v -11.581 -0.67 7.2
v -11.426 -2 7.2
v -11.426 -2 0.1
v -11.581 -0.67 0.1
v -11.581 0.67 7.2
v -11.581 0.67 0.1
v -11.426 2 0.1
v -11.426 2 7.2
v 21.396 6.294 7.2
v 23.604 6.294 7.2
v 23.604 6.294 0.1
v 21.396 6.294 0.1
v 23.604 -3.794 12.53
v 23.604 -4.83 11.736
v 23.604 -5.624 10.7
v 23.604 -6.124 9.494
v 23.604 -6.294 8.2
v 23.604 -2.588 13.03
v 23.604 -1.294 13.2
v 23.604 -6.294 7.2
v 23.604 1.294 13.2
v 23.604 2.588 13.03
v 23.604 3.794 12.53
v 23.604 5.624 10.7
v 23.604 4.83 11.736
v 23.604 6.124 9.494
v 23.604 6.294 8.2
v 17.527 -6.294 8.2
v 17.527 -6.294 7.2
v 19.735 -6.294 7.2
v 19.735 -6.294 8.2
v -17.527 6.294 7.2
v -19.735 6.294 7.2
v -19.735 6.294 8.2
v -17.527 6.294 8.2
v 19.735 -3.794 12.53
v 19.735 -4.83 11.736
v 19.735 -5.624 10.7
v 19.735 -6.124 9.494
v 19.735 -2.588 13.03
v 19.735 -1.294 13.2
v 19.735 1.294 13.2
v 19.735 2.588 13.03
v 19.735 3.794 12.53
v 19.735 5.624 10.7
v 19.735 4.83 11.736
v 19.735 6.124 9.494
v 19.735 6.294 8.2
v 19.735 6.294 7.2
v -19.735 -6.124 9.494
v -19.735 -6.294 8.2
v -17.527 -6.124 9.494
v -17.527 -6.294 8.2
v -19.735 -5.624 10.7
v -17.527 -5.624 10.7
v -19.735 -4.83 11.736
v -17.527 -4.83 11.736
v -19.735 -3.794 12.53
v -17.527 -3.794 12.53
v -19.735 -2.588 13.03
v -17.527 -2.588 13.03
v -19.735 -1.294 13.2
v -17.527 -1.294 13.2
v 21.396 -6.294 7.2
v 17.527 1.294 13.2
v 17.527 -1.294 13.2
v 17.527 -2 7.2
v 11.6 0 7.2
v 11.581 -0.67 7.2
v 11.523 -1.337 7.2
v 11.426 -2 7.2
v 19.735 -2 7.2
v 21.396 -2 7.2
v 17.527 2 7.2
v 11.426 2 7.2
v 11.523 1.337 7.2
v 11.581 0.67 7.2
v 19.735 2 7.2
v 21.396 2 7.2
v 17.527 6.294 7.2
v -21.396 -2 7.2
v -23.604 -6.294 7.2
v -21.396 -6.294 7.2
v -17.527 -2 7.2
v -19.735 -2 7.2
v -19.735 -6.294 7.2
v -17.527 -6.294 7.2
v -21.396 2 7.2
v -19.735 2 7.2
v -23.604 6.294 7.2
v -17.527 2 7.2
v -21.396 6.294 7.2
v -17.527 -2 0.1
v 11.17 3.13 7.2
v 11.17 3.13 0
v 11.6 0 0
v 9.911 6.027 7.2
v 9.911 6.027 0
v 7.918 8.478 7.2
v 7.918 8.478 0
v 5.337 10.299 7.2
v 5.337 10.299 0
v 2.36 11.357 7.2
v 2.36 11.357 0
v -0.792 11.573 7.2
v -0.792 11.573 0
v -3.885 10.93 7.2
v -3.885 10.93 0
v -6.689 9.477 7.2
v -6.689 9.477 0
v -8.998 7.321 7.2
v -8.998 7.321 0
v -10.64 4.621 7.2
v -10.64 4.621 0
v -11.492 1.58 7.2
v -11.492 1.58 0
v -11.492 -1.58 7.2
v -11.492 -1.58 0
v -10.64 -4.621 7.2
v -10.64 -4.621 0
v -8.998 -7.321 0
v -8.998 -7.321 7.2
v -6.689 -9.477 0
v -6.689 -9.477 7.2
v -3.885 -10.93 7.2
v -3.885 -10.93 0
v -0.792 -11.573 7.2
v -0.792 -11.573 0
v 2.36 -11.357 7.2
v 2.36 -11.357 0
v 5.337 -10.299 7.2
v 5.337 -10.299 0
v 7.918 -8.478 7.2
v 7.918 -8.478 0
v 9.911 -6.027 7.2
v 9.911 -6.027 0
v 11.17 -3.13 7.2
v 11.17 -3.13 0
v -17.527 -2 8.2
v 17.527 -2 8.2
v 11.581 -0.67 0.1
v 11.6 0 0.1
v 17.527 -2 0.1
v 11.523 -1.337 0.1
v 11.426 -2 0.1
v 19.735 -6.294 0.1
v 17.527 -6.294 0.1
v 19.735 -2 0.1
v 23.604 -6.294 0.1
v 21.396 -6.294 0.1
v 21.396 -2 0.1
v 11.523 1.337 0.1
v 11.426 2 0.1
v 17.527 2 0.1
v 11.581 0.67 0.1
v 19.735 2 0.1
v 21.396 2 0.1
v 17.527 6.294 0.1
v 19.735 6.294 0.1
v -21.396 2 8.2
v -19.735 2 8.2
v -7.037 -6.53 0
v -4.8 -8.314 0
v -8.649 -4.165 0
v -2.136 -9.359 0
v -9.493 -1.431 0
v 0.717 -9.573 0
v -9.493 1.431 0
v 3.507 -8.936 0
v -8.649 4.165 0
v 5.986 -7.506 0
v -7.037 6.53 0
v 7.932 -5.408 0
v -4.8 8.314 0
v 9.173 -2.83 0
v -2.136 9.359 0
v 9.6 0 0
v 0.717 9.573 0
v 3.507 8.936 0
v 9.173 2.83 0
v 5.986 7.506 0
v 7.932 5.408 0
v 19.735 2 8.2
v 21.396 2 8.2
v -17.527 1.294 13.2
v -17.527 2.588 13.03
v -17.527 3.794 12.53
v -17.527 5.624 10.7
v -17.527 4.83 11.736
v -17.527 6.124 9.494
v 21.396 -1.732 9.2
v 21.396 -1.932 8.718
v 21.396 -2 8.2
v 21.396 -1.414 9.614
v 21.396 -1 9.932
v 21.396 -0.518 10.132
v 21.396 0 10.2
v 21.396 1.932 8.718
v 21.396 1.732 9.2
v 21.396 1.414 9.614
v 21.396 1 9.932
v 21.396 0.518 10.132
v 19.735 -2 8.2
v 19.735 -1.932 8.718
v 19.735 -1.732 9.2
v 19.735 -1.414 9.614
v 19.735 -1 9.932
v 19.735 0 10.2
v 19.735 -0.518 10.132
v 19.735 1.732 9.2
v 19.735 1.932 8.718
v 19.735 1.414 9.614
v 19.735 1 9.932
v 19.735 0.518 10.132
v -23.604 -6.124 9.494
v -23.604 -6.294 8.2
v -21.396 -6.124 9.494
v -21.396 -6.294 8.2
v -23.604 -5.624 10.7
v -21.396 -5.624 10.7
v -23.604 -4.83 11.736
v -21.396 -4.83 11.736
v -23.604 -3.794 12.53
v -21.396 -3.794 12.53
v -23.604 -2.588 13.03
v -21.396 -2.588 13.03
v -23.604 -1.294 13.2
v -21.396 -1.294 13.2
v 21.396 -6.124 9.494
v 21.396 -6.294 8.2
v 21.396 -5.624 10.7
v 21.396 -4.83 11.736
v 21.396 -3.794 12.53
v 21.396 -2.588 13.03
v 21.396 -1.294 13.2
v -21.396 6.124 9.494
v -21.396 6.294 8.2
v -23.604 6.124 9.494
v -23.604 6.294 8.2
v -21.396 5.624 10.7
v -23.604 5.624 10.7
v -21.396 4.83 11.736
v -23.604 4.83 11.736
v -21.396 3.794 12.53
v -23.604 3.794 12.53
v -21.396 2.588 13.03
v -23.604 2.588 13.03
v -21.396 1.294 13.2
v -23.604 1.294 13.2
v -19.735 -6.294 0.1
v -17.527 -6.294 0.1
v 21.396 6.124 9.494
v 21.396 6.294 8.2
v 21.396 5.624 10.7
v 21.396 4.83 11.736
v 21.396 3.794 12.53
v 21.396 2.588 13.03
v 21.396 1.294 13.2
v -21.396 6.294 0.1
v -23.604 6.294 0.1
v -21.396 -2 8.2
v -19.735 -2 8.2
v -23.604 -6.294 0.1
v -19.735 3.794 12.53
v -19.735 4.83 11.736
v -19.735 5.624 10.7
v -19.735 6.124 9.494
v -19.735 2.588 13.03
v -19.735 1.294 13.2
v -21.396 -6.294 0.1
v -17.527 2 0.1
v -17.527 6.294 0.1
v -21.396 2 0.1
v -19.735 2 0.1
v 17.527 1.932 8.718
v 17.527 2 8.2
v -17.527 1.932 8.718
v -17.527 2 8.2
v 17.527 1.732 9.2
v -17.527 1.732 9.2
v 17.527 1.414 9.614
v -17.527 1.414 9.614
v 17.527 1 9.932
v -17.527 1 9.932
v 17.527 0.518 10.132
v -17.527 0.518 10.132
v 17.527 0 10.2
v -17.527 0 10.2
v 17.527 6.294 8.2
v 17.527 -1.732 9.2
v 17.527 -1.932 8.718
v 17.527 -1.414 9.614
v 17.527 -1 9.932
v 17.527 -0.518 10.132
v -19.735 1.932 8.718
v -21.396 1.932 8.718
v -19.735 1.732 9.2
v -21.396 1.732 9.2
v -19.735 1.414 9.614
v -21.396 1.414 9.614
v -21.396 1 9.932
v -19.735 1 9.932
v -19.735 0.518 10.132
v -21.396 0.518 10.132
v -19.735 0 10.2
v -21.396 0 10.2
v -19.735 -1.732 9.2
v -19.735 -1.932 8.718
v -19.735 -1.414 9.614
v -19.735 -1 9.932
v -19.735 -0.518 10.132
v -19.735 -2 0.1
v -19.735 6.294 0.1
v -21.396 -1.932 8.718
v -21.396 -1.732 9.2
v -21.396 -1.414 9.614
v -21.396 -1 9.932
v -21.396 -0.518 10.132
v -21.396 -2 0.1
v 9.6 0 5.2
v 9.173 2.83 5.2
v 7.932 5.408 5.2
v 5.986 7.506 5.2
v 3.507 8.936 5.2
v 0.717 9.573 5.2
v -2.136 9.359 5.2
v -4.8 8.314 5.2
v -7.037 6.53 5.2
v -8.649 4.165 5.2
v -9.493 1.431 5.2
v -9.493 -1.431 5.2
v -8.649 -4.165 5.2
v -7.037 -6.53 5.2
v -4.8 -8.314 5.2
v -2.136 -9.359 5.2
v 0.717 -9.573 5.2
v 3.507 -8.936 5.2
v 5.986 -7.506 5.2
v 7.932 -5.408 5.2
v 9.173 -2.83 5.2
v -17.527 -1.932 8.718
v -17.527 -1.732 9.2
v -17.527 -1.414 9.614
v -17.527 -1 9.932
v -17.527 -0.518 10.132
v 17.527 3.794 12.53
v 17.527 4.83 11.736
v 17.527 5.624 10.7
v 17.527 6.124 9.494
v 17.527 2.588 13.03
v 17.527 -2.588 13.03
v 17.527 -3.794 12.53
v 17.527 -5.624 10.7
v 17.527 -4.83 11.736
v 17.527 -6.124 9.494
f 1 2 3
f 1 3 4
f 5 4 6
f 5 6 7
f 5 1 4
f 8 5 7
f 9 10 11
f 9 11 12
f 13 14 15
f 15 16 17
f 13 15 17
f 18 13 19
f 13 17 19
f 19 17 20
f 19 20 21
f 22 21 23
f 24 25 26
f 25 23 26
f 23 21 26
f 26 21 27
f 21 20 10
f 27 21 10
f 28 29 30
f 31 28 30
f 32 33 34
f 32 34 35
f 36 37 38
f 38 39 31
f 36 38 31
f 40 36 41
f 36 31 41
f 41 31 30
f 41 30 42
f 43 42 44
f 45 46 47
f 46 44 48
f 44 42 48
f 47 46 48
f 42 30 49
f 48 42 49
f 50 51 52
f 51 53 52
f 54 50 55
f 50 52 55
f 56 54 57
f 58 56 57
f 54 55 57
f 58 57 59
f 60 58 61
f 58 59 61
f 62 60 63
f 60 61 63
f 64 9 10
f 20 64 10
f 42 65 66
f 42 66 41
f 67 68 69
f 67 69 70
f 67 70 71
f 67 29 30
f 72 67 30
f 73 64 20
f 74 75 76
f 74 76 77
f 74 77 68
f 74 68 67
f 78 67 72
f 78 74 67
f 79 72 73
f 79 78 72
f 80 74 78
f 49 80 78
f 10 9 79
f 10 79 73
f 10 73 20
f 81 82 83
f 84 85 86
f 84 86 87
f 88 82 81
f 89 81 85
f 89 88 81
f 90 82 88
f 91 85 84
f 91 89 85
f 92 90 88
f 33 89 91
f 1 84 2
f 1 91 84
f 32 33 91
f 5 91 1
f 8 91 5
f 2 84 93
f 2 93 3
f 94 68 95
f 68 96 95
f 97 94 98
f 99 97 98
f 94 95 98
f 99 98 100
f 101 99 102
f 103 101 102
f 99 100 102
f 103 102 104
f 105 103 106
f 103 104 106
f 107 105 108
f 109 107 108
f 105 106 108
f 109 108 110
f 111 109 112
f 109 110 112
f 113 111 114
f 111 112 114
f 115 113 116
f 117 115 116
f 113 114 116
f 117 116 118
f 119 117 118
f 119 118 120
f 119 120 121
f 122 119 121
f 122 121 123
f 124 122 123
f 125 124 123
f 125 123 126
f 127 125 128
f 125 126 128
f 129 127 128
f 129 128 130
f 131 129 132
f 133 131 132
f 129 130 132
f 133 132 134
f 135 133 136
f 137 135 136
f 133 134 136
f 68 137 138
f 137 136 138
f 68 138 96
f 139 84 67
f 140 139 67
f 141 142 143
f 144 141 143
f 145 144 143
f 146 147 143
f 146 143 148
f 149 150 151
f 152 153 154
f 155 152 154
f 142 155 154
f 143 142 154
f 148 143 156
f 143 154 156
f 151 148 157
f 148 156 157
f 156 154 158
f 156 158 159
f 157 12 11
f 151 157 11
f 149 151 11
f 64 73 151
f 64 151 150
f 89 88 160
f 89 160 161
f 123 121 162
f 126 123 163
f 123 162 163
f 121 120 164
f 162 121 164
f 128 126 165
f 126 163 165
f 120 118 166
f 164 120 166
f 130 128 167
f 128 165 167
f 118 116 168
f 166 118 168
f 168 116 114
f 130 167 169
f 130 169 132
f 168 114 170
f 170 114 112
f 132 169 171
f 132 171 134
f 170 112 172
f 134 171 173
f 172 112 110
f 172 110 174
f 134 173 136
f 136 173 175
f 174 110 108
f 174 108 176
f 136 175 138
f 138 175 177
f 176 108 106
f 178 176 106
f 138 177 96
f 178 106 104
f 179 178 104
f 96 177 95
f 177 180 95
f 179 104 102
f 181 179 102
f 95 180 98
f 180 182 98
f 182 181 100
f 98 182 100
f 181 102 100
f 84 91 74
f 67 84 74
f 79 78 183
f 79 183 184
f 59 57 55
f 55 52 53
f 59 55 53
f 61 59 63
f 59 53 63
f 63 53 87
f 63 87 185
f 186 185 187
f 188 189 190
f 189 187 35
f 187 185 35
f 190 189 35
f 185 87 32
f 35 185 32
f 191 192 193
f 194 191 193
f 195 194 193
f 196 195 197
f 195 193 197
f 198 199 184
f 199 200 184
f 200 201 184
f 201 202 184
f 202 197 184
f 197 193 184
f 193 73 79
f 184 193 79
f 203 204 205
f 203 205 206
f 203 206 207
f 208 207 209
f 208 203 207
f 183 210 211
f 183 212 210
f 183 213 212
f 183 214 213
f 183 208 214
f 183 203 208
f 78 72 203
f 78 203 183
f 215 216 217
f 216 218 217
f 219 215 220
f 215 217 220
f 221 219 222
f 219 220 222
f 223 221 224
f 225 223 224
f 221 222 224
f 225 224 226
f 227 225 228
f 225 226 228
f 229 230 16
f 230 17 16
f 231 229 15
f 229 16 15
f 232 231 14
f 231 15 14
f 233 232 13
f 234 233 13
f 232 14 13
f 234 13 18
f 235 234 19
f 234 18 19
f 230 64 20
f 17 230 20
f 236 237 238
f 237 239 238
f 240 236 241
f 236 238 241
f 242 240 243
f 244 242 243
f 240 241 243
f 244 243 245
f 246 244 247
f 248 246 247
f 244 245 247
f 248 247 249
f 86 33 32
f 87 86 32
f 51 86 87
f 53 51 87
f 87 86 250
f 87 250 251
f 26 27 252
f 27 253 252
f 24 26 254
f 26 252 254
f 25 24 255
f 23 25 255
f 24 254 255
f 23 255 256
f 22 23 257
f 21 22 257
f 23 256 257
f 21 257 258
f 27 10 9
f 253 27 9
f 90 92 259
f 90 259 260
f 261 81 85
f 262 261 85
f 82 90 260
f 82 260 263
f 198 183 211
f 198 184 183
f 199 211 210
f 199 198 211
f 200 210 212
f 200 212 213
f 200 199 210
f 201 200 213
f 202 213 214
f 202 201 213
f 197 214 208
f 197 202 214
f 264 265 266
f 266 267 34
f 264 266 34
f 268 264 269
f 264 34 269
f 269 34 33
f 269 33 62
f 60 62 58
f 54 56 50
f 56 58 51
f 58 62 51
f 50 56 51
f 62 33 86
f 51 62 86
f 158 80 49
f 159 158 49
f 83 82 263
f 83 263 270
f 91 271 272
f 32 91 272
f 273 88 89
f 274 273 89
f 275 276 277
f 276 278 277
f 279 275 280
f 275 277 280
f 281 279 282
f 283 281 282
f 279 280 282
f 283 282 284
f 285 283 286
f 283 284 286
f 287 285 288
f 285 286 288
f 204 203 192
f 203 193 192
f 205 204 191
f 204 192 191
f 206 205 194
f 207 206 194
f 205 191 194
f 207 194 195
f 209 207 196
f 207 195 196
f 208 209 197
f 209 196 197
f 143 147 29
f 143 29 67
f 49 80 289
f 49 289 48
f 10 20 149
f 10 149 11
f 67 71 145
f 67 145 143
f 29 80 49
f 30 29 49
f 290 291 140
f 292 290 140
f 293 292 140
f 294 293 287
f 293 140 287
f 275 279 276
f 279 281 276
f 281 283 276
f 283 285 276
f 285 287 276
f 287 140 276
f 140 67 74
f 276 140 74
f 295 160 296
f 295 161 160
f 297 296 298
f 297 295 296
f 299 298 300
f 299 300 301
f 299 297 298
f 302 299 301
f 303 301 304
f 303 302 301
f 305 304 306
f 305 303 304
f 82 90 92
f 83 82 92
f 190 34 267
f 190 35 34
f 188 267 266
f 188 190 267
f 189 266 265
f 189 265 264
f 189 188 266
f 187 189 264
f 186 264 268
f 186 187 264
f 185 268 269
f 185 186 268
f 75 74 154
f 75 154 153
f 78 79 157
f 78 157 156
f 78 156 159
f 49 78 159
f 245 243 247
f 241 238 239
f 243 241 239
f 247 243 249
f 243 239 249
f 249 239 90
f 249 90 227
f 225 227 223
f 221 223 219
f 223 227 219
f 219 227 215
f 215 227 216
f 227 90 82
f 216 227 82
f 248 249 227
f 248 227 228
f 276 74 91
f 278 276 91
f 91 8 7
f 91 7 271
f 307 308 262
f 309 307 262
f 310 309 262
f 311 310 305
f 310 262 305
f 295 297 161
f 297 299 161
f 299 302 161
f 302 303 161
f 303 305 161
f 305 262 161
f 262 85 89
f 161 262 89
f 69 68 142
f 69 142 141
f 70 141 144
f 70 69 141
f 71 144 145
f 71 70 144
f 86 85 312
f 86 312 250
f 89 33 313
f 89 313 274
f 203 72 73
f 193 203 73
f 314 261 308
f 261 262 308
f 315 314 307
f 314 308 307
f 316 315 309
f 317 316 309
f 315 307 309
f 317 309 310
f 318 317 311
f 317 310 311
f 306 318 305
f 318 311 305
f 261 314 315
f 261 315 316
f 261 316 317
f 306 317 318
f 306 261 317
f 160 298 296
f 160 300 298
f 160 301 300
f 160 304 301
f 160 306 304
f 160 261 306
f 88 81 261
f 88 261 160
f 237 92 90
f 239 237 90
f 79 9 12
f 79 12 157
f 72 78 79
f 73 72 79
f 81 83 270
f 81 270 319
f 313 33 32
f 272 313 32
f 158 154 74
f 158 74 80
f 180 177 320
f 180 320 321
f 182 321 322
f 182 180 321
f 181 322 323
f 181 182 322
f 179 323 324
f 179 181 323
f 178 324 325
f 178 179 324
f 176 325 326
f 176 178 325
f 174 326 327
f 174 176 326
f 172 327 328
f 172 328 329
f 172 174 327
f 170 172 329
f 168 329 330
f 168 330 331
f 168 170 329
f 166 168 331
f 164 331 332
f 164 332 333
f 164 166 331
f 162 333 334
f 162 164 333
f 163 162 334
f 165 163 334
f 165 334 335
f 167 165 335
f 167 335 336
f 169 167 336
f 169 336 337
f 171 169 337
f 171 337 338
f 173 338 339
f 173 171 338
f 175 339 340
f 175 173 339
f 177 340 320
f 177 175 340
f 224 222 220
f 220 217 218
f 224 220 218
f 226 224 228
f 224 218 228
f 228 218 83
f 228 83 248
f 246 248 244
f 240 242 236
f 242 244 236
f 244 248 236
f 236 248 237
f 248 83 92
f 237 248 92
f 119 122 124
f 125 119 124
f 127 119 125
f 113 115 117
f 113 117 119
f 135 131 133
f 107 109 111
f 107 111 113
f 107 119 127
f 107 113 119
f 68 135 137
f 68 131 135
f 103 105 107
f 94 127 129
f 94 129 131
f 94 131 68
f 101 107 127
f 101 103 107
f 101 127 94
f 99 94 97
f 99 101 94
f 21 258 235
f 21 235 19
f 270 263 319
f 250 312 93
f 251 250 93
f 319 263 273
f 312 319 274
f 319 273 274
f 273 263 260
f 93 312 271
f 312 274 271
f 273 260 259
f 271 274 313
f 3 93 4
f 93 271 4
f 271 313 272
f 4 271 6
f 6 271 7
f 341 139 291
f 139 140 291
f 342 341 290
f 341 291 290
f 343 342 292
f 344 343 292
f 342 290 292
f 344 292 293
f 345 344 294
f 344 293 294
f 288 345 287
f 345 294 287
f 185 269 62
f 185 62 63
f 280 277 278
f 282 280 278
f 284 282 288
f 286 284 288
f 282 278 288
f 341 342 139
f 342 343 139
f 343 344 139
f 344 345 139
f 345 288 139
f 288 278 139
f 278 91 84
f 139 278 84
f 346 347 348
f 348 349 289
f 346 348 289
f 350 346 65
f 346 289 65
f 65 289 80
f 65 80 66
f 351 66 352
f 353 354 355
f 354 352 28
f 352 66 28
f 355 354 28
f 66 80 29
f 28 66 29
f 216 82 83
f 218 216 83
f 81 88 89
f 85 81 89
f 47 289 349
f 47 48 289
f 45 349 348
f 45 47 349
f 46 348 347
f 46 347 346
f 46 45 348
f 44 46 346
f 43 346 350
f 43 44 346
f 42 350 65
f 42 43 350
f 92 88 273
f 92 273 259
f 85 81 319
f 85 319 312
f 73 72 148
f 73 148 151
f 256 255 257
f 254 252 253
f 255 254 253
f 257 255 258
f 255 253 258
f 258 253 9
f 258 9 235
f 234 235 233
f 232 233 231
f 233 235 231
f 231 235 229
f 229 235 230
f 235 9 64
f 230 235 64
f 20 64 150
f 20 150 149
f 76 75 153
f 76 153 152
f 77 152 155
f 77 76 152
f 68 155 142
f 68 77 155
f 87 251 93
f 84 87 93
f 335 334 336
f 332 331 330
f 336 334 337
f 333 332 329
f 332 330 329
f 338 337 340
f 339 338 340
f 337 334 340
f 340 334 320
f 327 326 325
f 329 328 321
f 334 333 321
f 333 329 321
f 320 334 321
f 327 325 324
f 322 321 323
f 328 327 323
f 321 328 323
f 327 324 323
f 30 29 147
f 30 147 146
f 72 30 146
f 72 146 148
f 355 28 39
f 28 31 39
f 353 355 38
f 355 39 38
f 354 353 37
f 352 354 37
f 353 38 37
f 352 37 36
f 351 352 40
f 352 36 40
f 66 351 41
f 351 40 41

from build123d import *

# Parameters (mm, degrees)
F0_R     = 11.6
F0_R_2   = 9.6
F1_DEPTH = 5.2
F2_R     = 11.6
F2_R_2   = 9.6
F3_DEPTH = 2
F4_W     = 2.2083204985
F4_H     = 4
F4_H_2   = 4.2943226658
F4_W_2   = 1.1041602492
F4_W_3   = 1.6607893258
F5_DEPTH = 7.1
F6_DEPTH = 3
F7_DEPTH = 6
F8_R     = 5
F8_2_R   = 5
F8_3_R   = 5
F8_4_R   = 5
F9_R     = 1.99999
F9_2_R   = 1.99999
F9_3_R   = 1.99999


# Not quite as in the source:
# - a fillet or chamfer is up to 0.001 mm smaller than in the source, because OpenCascade refuses the exact size


with BuildPart() as f1:
    # F0 (on Top) → F1 (new body)
    with BuildSketch(Plane.XY):
        Circle(F0_R)
        Circle(F0_R_2, mode=Mode.SUBTRACT)
    extrude(amount=F1_DEPTH)

    # F2 (on face) → F3 (join)
    with BuildSketch(Plane.XY.offset(5.2)):
        Circle(F2_R)
        Circle(F2_R_2, mode=Mode.SUBTRACT)
        Circle(F2_R_2)
    extrude(amount=F3_DEPTH)


with BuildPart() as f5:
    # F4 (on face) → F5 (new body)
    with BuildSketch(Plane.XY.offset(7.2)):
        with BuildLine():
            Line((-11.4262854857, 2), (-17.5267299265, 2))
            Line((-17.5267299265, 2), (-17.5267299265, -2))
            Line((-17.5267299265, -2), (-11.4262854857, -2))
            ThreePointArc((-11.4262854857, -2), (-11.6, 0), (-11.4262854857, 2))
        make_face()
        with Locations((-18.6308901757, 0)):
            Rectangle(F4_W, F4_H)
        with Locations((-18.6308901757, -4.1471613329)):
            Rectangle(F4_W, F4_H_2)
        Polygon((-22.5, -2), (-22.5, 2), (-21.3958397508, 2), (-21.3958397508, 6.2943226658), (-23.6041602492, 6.2943226658), (-23.6041602492, -6.2943226658), (-21.3958397508, -6.2943226658), (-21.3958397508, -2), align=None)
        with Locations((-21.9479198754, 0)):
            Rectangle(F4_W_2, F4_H)
        with Locations((-18.6308901757, 4.1471613329)):
            Rectangle(F4_W, F4_H_2)
        with Locations((-20.5654450879, 0)):
            Rectangle(F4_W_3, F4_H)
    extrude(amount=-F5_DEPTH)


with BuildPart() as f5b:
    # F4 (on face) → F5, piece 2 (new body)
    with BuildSketch(Plane.XY.offset(7.2)):
        with BuildLine():
            Line((17.5267299265, 2), (11.4262854857, 2))
            ThreePointArc((11.4262854857, 2), (11.5564897706, 1.0037650039), (11.6, 0))
            ThreePointArc((11.6, 0), (11.5564897706, -1.0037650039), (11.4262854857, -2))
            Line((11.4262854857, -2), (17.5267299265, -2))
            Line((17.5267299265, -2), (17.5267299265, 2))
        make_face()
        with Locations((18.6308901757, 0)):
            Rectangle(F4_W, F4_H)
        with Locations((18.6308901757, -4.1471613329)):
            Rectangle(F4_W, F4_H_2)
        Polygon((21.3958397508, 6.2943226658), (21.3958397508, 2), (22.5, 2), (22.5, -2), (21.3958397508, -2), (21.3958397508, -6.2943226658), (23.6041602492, -6.2943226658), (23.6041602492, 6.2943226658), align=None)
        with Locations((20.5654450879, 0)):
            Rectangle(F4_W_3, F4_H)
        with Locations((18.6308901757, 4.1471613329)):
            Rectangle(F4_W, F4_H_2)
        with Locations((21.9479198754, 0)):
            Rectangle(F4_W_2, F4_H)
    extrude(amount=-F5_DEPTH)


with BuildPart() as f6:
    # F4 (on face) → F6 (new body)
    with BuildSketch(Plane.XY.offset(7.2)):
        with BuildLine():
            Line((-11.4262854857, 2), (-17.5267299265, 2))
            Line((-17.5267299265, 2), (-17.5267299265, -2))
            Line((-17.5267299265, -2), (-11.4262854857, -2))
            ThreePointArc((-11.4262854857, -2), (-11.6, 0), (-11.4262854857, 2))
        make_face()
        with BuildLine():
            Line((11.4262854857, 2), (-11.4262854857, 2))
            ThreePointArc((-11.4262854857, 2), (-11.6, 0), (-11.4262854857, -2))
            Line((-11.4262854857, -2), (11.4262854857, -2))
            ThreePointArc((11.4262854857, -2), (11.5564897706, -1.0037650039), (11.6, 0))
            ThreePointArc((11.6, 0), (11.5564897706, 1.0037650039), (11.4262854857, 2))
        make_face()
        with BuildLine():
            Line((17.5267299265, 2), (11.4262854857, 2))
            ThreePointArc((11.4262854857, 2), (11.5564897706, 1.0037650039), (11.6, 0))
            ThreePointArc((11.6, 0), (11.5564897706, -1.0037650039), (11.4262854857, -2))
            Line((11.4262854857, -2), (17.5267299265, -2))
            Line((17.5267299265, -2), (17.5267299265, 2))
        make_face()
    extrude(amount=F6_DEPTH)

    # F9 (radius 2 in the source; OpenCascade refuses exactly that, so slightly less here)
    f9_edges = [f6.edges().sort_by_distance(p)[0] for p in [
        (0, -2, 10.2),
        (0, 2, 10.2),
    ]]
    fillet(f9_edges, radius=F9_R)


with BuildPart() as f6b:
    # F4 (on face) → F6, piece 2 (new body)
    with BuildSketch(Plane.XY.offset(7.2)):
        with Locations((-20.5654450879, 0)):
            Rectangle(F4_W_3, F4_H)
    extrude(amount=F6_DEPTH)

    # F9#3 (radius 2 in the source; OpenCascade refuses exactly that, so slightly less here)
    f9_3_edges = [f6b.edges().sort_by_distance(p)[0] for p in [
        (-20.565445, -2, 10.2),
        (-20.565445, 2, 10.2),
    ]]
    fillet(f9_3_edges, radius=F9_3_R)


with BuildPart() as f6c:
    # F4 (on face) → F6, piece 3 (new body)
    with BuildSketch(Plane.XY.offset(7.2)):
        with Locations((20.5654450879, 0)):
            Rectangle(F4_W_3, F4_H)
    extrude(amount=F6_DEPTH)

    # F9#2 (radius 2 in the source; OpenCascade refuses exactly that, so slightly less here)
    f9_2_edges = [f6c.edges().sort_by_distance(p)[0] for p in [
        (20.565445, -2, 10.2),
        (20.565445, 2, 10.2),
    ]]
    fillet(f9_2_edges, radius=F9_2_R)


with BuildPart() as f7:
    # F4 (on face) → F7 (new body)
    with BuildSketch(Plane.XY.offset(7.2)):
        Polygon((-22.5, -2), (-22.5, 2), (-21.3958397508, 2), (-21.3958397508, 6.2943226658), (-23.6041602492, 6.2943226658), (-23.6041602492, -6.2943226658), (-21.3958397508, -6.2943226658), (-21.3958397508, -2), align=None)
        with Locations((-21.9479198754, 0)):
            Rectangle(F4_W_2, F4_H)
    extrude(amount=F7_DEPTH)

    # F8
    f8_edges = [f7.edges().sort_by_distance(p)[0] for p in [
        (-22.5, 6.294323, 13.2),
        (-22.5, -6.294323, 13.2),
    ]]
    fillet(f8_edges, radius=F8_R)


with BuildPart() as f7b:
    # F4 (on face) → F7, piece 2 (new body)
    with BuildSketch(Plane.XY.offset(7.2)):
        with Locations((-18.6308901757, 4.1471613329)):
            Rectangle(F4_W, F4_H_2)
        with Locations((-18.6308901757, 0)):
            Rectangle(F4_W, F4_H)
        with Locations((-18.6308901757, -4.1471613329)):
            Rectangle(F4_W, F4_H_2)
    extrude(amount=F7_DEPTH)

    # F8#2
    f8_2_edges = [f7b.edges().sort_by_distance(p)[0] for p in [
        (-18.63089, 6.294323, 13.2),
        (-18.63089, -6.294323, 13.2),
    ]]
    fillet(f8_2_edges, radius=F8_2_R)


with BuildPart() as f7c:
    # F4 (on face) → F7, piece 3 (new body)
    with BuildSketch(Plane.XY.offset(7.2)):
        with Locations((18.6308901757, 4.1471613329)):
            Rectangle(F4_W, F4_H_2)
        with Locations((18.6308901757, 0)):
            Rectangle(F4_W, F4_H)
        with Locations((18.6308901757, -4.1471613329)):
            Rectangle(F4_W, F4_H_2)
    extrude(amount=F7_DEPTH)

    # F8#3
    f8_3_edges = [f7c.edges().sort_by_distance(p)[0] for p in [
        (18.63089, -6.294323, 13.2),
        (18.63089, 6.294323, 13.2),
    ]]
    fillet(f8_3_edges, radius=F8_3_R)


with BuildPart() as f7d:
    # F4 (on face) → F7, piece 4 (new body)
    with BuildSketch(Plane.XY.offset(7.2)):
        Polygon((21.3958397508, 6.2943226658), (21.3958397508, 2), (22.5, 2), (22.5, -2), (21.3958397508, -2), (21.3958397508, -6.2943226658), (23.6041602492, -6.2943226658), (23.6041602492, 6.2943226658), align=None)
        with Locations((21.9479198754, 0)):
            Rectangle(F4_W_2, F4_H)
    extrude(amount=F7_DEPTH)

    # F8#4
    f8_4_edges = [f7d.edges().sort_by_distance(p)[0] for p in [
        (22.5, -6.294323, 13.2),
        (22.5, 6.294323, 13.2),
    ]]
    fillet(f8_4_edges, radius=F8_4_R)


solid = Compound([f1.part, f5.part, f5b.part, f6.part, f6b.part, f6c.part, f7.part, f7b.part, f7c.part, f7d.part])
